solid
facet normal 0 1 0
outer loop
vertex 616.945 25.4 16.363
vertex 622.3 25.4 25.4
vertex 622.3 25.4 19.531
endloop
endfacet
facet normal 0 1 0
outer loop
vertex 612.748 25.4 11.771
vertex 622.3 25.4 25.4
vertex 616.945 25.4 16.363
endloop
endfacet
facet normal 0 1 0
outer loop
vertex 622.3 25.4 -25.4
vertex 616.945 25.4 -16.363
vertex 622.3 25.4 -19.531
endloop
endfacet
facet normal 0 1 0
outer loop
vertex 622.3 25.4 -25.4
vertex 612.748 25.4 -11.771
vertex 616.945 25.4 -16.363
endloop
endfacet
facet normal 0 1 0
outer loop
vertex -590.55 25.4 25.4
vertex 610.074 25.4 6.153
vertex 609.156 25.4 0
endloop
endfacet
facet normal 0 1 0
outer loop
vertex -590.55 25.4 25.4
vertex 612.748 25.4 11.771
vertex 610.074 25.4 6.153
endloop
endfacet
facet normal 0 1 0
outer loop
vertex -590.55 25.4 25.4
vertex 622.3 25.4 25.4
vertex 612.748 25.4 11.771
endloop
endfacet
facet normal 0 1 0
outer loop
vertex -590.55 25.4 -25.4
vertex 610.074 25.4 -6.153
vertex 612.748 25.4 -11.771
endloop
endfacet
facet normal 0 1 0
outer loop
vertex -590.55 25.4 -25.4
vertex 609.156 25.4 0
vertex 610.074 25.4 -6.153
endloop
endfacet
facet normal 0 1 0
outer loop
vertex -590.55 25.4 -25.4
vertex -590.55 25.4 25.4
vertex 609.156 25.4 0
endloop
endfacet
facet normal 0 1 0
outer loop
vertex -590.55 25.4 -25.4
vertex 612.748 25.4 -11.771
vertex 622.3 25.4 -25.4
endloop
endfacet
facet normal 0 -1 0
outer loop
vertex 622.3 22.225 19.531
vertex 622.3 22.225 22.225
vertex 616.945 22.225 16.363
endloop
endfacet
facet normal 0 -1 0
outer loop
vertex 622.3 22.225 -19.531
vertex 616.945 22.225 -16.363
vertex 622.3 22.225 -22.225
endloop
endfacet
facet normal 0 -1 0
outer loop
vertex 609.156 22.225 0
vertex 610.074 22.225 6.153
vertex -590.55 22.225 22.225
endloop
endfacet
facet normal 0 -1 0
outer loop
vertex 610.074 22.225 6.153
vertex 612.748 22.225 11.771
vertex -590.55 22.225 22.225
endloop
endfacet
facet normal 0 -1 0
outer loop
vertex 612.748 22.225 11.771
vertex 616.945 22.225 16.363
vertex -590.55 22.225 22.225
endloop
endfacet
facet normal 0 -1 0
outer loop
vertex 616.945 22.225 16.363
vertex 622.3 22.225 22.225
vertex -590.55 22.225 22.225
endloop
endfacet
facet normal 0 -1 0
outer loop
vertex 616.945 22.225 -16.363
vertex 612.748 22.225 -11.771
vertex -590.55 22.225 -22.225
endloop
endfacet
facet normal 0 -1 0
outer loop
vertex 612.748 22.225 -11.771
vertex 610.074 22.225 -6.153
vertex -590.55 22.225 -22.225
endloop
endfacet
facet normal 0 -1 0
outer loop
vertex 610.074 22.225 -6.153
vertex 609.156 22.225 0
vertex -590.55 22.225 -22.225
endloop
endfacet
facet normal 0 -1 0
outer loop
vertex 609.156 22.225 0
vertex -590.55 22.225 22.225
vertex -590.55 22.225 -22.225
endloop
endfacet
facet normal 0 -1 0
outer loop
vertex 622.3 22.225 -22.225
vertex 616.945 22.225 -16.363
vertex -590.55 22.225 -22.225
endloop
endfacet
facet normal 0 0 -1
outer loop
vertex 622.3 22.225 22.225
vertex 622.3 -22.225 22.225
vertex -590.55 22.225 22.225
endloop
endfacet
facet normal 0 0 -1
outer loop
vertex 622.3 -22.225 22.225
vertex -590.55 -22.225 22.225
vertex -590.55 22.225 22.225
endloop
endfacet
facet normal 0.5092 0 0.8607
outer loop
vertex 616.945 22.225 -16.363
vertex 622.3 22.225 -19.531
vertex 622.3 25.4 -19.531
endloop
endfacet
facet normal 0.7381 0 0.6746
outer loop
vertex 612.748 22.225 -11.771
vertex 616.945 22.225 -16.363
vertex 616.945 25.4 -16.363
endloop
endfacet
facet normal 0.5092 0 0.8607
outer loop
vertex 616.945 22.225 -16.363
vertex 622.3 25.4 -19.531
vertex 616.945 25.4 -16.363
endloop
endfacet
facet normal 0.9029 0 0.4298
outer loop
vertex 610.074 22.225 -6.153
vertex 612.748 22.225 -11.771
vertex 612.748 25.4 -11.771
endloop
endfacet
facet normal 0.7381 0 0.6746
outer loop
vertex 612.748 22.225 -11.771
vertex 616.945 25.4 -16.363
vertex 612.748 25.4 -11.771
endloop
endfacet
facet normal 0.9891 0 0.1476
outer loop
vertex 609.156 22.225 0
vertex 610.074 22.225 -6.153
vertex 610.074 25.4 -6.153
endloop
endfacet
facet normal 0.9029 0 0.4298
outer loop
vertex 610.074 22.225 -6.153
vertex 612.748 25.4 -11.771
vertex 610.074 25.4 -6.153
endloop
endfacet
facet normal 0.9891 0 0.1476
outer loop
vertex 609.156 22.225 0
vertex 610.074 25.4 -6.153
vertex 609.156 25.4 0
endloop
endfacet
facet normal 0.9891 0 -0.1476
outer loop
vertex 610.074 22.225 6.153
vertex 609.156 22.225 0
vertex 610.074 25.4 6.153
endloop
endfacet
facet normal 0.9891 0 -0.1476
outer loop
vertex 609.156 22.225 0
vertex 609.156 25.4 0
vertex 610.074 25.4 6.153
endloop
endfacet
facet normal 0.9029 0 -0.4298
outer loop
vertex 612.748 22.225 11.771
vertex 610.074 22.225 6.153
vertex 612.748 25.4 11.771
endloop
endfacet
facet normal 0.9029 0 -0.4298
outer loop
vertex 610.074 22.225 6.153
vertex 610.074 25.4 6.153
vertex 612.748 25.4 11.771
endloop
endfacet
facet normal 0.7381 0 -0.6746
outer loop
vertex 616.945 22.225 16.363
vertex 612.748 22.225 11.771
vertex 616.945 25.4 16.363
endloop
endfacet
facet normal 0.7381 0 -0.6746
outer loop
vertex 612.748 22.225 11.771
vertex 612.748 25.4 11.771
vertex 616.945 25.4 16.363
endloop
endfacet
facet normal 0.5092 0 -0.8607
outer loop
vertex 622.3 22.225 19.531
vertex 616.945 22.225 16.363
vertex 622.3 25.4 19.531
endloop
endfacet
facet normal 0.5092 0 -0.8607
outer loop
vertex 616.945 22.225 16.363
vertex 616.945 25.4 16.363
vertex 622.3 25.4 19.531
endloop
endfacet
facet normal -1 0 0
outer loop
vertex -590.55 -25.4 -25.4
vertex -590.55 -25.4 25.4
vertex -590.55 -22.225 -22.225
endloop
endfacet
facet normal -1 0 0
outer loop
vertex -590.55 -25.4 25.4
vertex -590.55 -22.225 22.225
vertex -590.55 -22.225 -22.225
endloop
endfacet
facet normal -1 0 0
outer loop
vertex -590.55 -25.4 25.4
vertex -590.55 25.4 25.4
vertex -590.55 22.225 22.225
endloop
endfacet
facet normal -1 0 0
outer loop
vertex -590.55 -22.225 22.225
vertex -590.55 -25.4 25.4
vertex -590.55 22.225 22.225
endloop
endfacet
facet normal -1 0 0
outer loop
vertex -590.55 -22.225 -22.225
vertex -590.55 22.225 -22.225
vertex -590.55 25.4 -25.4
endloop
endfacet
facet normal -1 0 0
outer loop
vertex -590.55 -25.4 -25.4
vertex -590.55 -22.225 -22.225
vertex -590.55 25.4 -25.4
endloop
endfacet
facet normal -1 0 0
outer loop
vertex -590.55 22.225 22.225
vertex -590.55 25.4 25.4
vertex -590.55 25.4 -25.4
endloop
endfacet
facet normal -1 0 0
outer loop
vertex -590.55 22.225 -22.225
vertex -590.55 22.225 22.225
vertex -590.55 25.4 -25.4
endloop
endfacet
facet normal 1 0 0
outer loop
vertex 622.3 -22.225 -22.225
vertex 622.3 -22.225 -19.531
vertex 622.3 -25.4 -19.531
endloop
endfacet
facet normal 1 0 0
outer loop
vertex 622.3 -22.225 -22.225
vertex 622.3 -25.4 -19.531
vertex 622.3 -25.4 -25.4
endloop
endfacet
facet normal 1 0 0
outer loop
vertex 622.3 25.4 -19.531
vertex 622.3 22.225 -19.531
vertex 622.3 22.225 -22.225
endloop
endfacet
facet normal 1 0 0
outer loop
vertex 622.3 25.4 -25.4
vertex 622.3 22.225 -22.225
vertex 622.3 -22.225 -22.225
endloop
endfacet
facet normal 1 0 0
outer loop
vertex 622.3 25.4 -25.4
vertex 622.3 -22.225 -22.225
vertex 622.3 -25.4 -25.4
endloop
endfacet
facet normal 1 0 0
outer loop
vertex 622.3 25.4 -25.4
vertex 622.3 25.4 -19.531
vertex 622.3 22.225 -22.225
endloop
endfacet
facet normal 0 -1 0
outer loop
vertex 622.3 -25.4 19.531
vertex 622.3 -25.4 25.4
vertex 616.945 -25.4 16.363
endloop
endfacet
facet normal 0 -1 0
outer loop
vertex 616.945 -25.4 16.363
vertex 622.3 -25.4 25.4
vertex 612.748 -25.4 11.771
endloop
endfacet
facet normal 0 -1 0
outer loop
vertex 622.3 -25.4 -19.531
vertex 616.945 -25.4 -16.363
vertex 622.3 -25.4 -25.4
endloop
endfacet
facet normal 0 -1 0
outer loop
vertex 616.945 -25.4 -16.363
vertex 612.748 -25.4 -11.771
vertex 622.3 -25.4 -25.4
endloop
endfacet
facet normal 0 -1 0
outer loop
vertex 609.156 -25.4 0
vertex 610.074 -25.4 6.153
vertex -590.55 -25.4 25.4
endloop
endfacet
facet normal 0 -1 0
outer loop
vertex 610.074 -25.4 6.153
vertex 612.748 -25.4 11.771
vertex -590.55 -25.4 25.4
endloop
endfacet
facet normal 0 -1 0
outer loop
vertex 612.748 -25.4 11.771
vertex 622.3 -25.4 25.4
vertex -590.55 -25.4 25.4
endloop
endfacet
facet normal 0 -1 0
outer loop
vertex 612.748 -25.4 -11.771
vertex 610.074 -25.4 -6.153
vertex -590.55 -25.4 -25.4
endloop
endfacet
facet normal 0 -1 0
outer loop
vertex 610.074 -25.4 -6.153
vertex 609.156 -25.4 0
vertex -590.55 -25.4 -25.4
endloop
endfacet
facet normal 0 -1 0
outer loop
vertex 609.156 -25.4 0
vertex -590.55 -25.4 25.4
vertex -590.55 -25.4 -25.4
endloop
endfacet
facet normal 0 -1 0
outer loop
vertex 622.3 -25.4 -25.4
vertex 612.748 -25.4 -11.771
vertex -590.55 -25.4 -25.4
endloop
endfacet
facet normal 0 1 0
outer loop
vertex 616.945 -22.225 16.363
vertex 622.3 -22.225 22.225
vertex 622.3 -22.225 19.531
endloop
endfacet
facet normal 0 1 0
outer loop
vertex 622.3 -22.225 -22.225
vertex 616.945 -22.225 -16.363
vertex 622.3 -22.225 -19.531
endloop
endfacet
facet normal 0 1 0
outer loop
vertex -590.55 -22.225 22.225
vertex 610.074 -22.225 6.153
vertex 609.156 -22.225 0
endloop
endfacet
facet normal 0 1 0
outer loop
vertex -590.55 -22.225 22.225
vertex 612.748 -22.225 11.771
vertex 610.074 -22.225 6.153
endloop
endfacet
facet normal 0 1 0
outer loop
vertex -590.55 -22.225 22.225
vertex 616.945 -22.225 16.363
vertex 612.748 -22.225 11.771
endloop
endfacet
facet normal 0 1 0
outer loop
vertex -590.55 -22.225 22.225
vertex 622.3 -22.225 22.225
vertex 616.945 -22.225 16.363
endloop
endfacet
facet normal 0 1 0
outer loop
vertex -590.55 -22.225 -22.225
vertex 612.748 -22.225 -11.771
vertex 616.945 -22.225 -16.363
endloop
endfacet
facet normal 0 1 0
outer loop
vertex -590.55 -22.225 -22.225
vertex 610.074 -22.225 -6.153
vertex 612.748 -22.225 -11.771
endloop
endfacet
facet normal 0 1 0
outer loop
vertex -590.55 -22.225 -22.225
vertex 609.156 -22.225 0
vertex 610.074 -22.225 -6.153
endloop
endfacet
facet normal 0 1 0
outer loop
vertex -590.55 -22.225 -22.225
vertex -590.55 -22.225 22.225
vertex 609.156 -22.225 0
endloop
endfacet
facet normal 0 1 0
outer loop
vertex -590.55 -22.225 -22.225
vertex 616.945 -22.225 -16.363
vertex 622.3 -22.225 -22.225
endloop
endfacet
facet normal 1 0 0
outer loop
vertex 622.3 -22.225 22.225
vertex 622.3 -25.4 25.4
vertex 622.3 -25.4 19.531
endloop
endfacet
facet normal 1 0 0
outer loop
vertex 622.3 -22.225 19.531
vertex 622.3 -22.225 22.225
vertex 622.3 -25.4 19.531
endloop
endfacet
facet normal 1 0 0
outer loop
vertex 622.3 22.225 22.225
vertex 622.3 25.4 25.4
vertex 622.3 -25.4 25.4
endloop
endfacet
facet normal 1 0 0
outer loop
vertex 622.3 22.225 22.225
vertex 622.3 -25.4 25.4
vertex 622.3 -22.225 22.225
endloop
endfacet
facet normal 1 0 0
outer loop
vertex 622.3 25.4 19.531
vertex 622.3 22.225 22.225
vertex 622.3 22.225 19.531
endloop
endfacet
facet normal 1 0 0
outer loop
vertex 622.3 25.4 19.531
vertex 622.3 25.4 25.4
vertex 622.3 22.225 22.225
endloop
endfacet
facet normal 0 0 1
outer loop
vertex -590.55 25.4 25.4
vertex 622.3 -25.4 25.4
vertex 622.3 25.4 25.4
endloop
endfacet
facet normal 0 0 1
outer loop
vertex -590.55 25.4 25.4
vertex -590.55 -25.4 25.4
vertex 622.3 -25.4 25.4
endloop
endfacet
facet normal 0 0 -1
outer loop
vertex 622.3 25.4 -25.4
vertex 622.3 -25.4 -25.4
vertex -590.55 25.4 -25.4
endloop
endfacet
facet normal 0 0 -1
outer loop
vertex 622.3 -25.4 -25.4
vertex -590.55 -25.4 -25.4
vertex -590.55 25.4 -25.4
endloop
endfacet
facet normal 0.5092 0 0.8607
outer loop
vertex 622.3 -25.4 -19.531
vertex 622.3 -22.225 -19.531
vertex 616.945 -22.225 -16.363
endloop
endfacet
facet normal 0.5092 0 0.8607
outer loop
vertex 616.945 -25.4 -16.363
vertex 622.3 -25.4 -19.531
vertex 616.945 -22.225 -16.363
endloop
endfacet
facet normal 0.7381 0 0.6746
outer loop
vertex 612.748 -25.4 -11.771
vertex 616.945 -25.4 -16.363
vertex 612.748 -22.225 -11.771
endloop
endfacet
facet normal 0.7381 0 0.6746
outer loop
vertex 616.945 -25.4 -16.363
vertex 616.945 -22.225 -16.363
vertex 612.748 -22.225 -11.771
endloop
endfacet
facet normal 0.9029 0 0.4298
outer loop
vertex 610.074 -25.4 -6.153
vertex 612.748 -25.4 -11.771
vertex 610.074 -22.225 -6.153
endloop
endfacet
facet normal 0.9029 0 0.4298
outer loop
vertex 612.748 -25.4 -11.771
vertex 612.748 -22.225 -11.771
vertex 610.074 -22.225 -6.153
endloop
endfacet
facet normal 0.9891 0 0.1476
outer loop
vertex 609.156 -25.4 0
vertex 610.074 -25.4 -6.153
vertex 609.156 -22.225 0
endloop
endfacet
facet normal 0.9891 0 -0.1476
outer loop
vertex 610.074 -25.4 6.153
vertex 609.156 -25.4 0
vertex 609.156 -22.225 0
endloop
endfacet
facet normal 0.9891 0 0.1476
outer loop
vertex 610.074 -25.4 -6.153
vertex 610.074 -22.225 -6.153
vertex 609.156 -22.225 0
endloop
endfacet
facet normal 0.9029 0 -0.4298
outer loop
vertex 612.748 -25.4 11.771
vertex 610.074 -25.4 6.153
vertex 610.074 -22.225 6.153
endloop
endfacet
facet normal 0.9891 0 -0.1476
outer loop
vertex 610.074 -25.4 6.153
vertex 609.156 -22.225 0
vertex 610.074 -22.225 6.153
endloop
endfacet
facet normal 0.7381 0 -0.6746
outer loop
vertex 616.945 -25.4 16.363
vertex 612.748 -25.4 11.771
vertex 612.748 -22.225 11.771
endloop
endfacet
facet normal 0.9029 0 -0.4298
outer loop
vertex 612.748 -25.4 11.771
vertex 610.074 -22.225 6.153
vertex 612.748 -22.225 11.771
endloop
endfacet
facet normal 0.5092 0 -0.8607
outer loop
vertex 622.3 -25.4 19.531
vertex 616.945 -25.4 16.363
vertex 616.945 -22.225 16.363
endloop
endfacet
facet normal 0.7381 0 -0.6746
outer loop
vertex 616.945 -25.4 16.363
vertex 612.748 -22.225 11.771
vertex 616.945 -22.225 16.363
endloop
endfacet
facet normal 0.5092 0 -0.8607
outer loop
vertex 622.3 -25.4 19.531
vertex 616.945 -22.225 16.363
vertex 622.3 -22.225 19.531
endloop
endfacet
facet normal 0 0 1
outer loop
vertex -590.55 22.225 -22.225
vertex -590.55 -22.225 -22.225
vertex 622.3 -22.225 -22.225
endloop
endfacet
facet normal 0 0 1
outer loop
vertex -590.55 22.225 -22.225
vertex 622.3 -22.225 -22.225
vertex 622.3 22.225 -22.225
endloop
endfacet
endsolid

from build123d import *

# Parameters (mm, degrees)
SKETCH1_W                = 50.8
SKETCH1_H                = 50.8
SKETCH1_W_2              = 44.45
SKETCH1_H_2              = 44.45
BOSS_EXTRUDE1_DEPTH      = 590.55
BOSS_EXTRUDE1_DEPTH_BACK = 590.55
SKETCH6_W                = 50.8
SKETCH6_H                = 50.8
SKETCH6_W_2              = 44.45
SKETCH6_H_2              = 44.45
BOSS_EXTRUDE2_DEPTH      = 31.75
SKETCH7_R                = 21.082
CUT_EXTRUDE1_DEPTH       = 50.8


with BuildPart() as part:
    # Sketch1 → Boss-Extrude1 (new body, two sides)
    with BuildSketch(Plane(origin=(0, 0, 0), x_dir=(0, 0, -1), z_dir=(1, 0, 0))) as boss_extrude1_sk:
        Rectangle(SKETCH1_W, SKETCH1_H)
        Rectangle(SKETCH1_W_2, SKETCH1_H_2, mode=Mode.SUBTRACT)
    extrude(amount=BOSS_EXTRUDE1_DEPTH)
    extrude(boss_extrude1_sk.sketch, amount=-BOSS_EXTRUDE1_DEPTH_BACK)

    # Sketch6 → Boss-Extrude2 (add)
    with BuildSketch(Plane(origin=(590.55, 0, 0), x_dir=(0, 0, -1), z_dir=(1, 0, 0))):
        Rectangle(SKETCH6_W, SKETCH6_H)
        Rectangle(SKETCH6_W_2, SKETCH6_H_2, mode=Mode.SUBTRACT)
    extrude(amount=BOSS_EXTRUDE2_DEPTH)

    # Sketch7 → Cut-Extrude1 (cut)
    with BuildSketch(Plane(origin=(0, 25.4, 0), x_dir=(1, 0, 0), z_dir=(0, 1, 0))):
        with Locations((630.2375, 0)):
            Circle(SKETCH7_R)
    extrude(amount=-CUT_EXTRUDE1_DEPTH, mode=Mode.SUBTRACT)


solid = part.part
